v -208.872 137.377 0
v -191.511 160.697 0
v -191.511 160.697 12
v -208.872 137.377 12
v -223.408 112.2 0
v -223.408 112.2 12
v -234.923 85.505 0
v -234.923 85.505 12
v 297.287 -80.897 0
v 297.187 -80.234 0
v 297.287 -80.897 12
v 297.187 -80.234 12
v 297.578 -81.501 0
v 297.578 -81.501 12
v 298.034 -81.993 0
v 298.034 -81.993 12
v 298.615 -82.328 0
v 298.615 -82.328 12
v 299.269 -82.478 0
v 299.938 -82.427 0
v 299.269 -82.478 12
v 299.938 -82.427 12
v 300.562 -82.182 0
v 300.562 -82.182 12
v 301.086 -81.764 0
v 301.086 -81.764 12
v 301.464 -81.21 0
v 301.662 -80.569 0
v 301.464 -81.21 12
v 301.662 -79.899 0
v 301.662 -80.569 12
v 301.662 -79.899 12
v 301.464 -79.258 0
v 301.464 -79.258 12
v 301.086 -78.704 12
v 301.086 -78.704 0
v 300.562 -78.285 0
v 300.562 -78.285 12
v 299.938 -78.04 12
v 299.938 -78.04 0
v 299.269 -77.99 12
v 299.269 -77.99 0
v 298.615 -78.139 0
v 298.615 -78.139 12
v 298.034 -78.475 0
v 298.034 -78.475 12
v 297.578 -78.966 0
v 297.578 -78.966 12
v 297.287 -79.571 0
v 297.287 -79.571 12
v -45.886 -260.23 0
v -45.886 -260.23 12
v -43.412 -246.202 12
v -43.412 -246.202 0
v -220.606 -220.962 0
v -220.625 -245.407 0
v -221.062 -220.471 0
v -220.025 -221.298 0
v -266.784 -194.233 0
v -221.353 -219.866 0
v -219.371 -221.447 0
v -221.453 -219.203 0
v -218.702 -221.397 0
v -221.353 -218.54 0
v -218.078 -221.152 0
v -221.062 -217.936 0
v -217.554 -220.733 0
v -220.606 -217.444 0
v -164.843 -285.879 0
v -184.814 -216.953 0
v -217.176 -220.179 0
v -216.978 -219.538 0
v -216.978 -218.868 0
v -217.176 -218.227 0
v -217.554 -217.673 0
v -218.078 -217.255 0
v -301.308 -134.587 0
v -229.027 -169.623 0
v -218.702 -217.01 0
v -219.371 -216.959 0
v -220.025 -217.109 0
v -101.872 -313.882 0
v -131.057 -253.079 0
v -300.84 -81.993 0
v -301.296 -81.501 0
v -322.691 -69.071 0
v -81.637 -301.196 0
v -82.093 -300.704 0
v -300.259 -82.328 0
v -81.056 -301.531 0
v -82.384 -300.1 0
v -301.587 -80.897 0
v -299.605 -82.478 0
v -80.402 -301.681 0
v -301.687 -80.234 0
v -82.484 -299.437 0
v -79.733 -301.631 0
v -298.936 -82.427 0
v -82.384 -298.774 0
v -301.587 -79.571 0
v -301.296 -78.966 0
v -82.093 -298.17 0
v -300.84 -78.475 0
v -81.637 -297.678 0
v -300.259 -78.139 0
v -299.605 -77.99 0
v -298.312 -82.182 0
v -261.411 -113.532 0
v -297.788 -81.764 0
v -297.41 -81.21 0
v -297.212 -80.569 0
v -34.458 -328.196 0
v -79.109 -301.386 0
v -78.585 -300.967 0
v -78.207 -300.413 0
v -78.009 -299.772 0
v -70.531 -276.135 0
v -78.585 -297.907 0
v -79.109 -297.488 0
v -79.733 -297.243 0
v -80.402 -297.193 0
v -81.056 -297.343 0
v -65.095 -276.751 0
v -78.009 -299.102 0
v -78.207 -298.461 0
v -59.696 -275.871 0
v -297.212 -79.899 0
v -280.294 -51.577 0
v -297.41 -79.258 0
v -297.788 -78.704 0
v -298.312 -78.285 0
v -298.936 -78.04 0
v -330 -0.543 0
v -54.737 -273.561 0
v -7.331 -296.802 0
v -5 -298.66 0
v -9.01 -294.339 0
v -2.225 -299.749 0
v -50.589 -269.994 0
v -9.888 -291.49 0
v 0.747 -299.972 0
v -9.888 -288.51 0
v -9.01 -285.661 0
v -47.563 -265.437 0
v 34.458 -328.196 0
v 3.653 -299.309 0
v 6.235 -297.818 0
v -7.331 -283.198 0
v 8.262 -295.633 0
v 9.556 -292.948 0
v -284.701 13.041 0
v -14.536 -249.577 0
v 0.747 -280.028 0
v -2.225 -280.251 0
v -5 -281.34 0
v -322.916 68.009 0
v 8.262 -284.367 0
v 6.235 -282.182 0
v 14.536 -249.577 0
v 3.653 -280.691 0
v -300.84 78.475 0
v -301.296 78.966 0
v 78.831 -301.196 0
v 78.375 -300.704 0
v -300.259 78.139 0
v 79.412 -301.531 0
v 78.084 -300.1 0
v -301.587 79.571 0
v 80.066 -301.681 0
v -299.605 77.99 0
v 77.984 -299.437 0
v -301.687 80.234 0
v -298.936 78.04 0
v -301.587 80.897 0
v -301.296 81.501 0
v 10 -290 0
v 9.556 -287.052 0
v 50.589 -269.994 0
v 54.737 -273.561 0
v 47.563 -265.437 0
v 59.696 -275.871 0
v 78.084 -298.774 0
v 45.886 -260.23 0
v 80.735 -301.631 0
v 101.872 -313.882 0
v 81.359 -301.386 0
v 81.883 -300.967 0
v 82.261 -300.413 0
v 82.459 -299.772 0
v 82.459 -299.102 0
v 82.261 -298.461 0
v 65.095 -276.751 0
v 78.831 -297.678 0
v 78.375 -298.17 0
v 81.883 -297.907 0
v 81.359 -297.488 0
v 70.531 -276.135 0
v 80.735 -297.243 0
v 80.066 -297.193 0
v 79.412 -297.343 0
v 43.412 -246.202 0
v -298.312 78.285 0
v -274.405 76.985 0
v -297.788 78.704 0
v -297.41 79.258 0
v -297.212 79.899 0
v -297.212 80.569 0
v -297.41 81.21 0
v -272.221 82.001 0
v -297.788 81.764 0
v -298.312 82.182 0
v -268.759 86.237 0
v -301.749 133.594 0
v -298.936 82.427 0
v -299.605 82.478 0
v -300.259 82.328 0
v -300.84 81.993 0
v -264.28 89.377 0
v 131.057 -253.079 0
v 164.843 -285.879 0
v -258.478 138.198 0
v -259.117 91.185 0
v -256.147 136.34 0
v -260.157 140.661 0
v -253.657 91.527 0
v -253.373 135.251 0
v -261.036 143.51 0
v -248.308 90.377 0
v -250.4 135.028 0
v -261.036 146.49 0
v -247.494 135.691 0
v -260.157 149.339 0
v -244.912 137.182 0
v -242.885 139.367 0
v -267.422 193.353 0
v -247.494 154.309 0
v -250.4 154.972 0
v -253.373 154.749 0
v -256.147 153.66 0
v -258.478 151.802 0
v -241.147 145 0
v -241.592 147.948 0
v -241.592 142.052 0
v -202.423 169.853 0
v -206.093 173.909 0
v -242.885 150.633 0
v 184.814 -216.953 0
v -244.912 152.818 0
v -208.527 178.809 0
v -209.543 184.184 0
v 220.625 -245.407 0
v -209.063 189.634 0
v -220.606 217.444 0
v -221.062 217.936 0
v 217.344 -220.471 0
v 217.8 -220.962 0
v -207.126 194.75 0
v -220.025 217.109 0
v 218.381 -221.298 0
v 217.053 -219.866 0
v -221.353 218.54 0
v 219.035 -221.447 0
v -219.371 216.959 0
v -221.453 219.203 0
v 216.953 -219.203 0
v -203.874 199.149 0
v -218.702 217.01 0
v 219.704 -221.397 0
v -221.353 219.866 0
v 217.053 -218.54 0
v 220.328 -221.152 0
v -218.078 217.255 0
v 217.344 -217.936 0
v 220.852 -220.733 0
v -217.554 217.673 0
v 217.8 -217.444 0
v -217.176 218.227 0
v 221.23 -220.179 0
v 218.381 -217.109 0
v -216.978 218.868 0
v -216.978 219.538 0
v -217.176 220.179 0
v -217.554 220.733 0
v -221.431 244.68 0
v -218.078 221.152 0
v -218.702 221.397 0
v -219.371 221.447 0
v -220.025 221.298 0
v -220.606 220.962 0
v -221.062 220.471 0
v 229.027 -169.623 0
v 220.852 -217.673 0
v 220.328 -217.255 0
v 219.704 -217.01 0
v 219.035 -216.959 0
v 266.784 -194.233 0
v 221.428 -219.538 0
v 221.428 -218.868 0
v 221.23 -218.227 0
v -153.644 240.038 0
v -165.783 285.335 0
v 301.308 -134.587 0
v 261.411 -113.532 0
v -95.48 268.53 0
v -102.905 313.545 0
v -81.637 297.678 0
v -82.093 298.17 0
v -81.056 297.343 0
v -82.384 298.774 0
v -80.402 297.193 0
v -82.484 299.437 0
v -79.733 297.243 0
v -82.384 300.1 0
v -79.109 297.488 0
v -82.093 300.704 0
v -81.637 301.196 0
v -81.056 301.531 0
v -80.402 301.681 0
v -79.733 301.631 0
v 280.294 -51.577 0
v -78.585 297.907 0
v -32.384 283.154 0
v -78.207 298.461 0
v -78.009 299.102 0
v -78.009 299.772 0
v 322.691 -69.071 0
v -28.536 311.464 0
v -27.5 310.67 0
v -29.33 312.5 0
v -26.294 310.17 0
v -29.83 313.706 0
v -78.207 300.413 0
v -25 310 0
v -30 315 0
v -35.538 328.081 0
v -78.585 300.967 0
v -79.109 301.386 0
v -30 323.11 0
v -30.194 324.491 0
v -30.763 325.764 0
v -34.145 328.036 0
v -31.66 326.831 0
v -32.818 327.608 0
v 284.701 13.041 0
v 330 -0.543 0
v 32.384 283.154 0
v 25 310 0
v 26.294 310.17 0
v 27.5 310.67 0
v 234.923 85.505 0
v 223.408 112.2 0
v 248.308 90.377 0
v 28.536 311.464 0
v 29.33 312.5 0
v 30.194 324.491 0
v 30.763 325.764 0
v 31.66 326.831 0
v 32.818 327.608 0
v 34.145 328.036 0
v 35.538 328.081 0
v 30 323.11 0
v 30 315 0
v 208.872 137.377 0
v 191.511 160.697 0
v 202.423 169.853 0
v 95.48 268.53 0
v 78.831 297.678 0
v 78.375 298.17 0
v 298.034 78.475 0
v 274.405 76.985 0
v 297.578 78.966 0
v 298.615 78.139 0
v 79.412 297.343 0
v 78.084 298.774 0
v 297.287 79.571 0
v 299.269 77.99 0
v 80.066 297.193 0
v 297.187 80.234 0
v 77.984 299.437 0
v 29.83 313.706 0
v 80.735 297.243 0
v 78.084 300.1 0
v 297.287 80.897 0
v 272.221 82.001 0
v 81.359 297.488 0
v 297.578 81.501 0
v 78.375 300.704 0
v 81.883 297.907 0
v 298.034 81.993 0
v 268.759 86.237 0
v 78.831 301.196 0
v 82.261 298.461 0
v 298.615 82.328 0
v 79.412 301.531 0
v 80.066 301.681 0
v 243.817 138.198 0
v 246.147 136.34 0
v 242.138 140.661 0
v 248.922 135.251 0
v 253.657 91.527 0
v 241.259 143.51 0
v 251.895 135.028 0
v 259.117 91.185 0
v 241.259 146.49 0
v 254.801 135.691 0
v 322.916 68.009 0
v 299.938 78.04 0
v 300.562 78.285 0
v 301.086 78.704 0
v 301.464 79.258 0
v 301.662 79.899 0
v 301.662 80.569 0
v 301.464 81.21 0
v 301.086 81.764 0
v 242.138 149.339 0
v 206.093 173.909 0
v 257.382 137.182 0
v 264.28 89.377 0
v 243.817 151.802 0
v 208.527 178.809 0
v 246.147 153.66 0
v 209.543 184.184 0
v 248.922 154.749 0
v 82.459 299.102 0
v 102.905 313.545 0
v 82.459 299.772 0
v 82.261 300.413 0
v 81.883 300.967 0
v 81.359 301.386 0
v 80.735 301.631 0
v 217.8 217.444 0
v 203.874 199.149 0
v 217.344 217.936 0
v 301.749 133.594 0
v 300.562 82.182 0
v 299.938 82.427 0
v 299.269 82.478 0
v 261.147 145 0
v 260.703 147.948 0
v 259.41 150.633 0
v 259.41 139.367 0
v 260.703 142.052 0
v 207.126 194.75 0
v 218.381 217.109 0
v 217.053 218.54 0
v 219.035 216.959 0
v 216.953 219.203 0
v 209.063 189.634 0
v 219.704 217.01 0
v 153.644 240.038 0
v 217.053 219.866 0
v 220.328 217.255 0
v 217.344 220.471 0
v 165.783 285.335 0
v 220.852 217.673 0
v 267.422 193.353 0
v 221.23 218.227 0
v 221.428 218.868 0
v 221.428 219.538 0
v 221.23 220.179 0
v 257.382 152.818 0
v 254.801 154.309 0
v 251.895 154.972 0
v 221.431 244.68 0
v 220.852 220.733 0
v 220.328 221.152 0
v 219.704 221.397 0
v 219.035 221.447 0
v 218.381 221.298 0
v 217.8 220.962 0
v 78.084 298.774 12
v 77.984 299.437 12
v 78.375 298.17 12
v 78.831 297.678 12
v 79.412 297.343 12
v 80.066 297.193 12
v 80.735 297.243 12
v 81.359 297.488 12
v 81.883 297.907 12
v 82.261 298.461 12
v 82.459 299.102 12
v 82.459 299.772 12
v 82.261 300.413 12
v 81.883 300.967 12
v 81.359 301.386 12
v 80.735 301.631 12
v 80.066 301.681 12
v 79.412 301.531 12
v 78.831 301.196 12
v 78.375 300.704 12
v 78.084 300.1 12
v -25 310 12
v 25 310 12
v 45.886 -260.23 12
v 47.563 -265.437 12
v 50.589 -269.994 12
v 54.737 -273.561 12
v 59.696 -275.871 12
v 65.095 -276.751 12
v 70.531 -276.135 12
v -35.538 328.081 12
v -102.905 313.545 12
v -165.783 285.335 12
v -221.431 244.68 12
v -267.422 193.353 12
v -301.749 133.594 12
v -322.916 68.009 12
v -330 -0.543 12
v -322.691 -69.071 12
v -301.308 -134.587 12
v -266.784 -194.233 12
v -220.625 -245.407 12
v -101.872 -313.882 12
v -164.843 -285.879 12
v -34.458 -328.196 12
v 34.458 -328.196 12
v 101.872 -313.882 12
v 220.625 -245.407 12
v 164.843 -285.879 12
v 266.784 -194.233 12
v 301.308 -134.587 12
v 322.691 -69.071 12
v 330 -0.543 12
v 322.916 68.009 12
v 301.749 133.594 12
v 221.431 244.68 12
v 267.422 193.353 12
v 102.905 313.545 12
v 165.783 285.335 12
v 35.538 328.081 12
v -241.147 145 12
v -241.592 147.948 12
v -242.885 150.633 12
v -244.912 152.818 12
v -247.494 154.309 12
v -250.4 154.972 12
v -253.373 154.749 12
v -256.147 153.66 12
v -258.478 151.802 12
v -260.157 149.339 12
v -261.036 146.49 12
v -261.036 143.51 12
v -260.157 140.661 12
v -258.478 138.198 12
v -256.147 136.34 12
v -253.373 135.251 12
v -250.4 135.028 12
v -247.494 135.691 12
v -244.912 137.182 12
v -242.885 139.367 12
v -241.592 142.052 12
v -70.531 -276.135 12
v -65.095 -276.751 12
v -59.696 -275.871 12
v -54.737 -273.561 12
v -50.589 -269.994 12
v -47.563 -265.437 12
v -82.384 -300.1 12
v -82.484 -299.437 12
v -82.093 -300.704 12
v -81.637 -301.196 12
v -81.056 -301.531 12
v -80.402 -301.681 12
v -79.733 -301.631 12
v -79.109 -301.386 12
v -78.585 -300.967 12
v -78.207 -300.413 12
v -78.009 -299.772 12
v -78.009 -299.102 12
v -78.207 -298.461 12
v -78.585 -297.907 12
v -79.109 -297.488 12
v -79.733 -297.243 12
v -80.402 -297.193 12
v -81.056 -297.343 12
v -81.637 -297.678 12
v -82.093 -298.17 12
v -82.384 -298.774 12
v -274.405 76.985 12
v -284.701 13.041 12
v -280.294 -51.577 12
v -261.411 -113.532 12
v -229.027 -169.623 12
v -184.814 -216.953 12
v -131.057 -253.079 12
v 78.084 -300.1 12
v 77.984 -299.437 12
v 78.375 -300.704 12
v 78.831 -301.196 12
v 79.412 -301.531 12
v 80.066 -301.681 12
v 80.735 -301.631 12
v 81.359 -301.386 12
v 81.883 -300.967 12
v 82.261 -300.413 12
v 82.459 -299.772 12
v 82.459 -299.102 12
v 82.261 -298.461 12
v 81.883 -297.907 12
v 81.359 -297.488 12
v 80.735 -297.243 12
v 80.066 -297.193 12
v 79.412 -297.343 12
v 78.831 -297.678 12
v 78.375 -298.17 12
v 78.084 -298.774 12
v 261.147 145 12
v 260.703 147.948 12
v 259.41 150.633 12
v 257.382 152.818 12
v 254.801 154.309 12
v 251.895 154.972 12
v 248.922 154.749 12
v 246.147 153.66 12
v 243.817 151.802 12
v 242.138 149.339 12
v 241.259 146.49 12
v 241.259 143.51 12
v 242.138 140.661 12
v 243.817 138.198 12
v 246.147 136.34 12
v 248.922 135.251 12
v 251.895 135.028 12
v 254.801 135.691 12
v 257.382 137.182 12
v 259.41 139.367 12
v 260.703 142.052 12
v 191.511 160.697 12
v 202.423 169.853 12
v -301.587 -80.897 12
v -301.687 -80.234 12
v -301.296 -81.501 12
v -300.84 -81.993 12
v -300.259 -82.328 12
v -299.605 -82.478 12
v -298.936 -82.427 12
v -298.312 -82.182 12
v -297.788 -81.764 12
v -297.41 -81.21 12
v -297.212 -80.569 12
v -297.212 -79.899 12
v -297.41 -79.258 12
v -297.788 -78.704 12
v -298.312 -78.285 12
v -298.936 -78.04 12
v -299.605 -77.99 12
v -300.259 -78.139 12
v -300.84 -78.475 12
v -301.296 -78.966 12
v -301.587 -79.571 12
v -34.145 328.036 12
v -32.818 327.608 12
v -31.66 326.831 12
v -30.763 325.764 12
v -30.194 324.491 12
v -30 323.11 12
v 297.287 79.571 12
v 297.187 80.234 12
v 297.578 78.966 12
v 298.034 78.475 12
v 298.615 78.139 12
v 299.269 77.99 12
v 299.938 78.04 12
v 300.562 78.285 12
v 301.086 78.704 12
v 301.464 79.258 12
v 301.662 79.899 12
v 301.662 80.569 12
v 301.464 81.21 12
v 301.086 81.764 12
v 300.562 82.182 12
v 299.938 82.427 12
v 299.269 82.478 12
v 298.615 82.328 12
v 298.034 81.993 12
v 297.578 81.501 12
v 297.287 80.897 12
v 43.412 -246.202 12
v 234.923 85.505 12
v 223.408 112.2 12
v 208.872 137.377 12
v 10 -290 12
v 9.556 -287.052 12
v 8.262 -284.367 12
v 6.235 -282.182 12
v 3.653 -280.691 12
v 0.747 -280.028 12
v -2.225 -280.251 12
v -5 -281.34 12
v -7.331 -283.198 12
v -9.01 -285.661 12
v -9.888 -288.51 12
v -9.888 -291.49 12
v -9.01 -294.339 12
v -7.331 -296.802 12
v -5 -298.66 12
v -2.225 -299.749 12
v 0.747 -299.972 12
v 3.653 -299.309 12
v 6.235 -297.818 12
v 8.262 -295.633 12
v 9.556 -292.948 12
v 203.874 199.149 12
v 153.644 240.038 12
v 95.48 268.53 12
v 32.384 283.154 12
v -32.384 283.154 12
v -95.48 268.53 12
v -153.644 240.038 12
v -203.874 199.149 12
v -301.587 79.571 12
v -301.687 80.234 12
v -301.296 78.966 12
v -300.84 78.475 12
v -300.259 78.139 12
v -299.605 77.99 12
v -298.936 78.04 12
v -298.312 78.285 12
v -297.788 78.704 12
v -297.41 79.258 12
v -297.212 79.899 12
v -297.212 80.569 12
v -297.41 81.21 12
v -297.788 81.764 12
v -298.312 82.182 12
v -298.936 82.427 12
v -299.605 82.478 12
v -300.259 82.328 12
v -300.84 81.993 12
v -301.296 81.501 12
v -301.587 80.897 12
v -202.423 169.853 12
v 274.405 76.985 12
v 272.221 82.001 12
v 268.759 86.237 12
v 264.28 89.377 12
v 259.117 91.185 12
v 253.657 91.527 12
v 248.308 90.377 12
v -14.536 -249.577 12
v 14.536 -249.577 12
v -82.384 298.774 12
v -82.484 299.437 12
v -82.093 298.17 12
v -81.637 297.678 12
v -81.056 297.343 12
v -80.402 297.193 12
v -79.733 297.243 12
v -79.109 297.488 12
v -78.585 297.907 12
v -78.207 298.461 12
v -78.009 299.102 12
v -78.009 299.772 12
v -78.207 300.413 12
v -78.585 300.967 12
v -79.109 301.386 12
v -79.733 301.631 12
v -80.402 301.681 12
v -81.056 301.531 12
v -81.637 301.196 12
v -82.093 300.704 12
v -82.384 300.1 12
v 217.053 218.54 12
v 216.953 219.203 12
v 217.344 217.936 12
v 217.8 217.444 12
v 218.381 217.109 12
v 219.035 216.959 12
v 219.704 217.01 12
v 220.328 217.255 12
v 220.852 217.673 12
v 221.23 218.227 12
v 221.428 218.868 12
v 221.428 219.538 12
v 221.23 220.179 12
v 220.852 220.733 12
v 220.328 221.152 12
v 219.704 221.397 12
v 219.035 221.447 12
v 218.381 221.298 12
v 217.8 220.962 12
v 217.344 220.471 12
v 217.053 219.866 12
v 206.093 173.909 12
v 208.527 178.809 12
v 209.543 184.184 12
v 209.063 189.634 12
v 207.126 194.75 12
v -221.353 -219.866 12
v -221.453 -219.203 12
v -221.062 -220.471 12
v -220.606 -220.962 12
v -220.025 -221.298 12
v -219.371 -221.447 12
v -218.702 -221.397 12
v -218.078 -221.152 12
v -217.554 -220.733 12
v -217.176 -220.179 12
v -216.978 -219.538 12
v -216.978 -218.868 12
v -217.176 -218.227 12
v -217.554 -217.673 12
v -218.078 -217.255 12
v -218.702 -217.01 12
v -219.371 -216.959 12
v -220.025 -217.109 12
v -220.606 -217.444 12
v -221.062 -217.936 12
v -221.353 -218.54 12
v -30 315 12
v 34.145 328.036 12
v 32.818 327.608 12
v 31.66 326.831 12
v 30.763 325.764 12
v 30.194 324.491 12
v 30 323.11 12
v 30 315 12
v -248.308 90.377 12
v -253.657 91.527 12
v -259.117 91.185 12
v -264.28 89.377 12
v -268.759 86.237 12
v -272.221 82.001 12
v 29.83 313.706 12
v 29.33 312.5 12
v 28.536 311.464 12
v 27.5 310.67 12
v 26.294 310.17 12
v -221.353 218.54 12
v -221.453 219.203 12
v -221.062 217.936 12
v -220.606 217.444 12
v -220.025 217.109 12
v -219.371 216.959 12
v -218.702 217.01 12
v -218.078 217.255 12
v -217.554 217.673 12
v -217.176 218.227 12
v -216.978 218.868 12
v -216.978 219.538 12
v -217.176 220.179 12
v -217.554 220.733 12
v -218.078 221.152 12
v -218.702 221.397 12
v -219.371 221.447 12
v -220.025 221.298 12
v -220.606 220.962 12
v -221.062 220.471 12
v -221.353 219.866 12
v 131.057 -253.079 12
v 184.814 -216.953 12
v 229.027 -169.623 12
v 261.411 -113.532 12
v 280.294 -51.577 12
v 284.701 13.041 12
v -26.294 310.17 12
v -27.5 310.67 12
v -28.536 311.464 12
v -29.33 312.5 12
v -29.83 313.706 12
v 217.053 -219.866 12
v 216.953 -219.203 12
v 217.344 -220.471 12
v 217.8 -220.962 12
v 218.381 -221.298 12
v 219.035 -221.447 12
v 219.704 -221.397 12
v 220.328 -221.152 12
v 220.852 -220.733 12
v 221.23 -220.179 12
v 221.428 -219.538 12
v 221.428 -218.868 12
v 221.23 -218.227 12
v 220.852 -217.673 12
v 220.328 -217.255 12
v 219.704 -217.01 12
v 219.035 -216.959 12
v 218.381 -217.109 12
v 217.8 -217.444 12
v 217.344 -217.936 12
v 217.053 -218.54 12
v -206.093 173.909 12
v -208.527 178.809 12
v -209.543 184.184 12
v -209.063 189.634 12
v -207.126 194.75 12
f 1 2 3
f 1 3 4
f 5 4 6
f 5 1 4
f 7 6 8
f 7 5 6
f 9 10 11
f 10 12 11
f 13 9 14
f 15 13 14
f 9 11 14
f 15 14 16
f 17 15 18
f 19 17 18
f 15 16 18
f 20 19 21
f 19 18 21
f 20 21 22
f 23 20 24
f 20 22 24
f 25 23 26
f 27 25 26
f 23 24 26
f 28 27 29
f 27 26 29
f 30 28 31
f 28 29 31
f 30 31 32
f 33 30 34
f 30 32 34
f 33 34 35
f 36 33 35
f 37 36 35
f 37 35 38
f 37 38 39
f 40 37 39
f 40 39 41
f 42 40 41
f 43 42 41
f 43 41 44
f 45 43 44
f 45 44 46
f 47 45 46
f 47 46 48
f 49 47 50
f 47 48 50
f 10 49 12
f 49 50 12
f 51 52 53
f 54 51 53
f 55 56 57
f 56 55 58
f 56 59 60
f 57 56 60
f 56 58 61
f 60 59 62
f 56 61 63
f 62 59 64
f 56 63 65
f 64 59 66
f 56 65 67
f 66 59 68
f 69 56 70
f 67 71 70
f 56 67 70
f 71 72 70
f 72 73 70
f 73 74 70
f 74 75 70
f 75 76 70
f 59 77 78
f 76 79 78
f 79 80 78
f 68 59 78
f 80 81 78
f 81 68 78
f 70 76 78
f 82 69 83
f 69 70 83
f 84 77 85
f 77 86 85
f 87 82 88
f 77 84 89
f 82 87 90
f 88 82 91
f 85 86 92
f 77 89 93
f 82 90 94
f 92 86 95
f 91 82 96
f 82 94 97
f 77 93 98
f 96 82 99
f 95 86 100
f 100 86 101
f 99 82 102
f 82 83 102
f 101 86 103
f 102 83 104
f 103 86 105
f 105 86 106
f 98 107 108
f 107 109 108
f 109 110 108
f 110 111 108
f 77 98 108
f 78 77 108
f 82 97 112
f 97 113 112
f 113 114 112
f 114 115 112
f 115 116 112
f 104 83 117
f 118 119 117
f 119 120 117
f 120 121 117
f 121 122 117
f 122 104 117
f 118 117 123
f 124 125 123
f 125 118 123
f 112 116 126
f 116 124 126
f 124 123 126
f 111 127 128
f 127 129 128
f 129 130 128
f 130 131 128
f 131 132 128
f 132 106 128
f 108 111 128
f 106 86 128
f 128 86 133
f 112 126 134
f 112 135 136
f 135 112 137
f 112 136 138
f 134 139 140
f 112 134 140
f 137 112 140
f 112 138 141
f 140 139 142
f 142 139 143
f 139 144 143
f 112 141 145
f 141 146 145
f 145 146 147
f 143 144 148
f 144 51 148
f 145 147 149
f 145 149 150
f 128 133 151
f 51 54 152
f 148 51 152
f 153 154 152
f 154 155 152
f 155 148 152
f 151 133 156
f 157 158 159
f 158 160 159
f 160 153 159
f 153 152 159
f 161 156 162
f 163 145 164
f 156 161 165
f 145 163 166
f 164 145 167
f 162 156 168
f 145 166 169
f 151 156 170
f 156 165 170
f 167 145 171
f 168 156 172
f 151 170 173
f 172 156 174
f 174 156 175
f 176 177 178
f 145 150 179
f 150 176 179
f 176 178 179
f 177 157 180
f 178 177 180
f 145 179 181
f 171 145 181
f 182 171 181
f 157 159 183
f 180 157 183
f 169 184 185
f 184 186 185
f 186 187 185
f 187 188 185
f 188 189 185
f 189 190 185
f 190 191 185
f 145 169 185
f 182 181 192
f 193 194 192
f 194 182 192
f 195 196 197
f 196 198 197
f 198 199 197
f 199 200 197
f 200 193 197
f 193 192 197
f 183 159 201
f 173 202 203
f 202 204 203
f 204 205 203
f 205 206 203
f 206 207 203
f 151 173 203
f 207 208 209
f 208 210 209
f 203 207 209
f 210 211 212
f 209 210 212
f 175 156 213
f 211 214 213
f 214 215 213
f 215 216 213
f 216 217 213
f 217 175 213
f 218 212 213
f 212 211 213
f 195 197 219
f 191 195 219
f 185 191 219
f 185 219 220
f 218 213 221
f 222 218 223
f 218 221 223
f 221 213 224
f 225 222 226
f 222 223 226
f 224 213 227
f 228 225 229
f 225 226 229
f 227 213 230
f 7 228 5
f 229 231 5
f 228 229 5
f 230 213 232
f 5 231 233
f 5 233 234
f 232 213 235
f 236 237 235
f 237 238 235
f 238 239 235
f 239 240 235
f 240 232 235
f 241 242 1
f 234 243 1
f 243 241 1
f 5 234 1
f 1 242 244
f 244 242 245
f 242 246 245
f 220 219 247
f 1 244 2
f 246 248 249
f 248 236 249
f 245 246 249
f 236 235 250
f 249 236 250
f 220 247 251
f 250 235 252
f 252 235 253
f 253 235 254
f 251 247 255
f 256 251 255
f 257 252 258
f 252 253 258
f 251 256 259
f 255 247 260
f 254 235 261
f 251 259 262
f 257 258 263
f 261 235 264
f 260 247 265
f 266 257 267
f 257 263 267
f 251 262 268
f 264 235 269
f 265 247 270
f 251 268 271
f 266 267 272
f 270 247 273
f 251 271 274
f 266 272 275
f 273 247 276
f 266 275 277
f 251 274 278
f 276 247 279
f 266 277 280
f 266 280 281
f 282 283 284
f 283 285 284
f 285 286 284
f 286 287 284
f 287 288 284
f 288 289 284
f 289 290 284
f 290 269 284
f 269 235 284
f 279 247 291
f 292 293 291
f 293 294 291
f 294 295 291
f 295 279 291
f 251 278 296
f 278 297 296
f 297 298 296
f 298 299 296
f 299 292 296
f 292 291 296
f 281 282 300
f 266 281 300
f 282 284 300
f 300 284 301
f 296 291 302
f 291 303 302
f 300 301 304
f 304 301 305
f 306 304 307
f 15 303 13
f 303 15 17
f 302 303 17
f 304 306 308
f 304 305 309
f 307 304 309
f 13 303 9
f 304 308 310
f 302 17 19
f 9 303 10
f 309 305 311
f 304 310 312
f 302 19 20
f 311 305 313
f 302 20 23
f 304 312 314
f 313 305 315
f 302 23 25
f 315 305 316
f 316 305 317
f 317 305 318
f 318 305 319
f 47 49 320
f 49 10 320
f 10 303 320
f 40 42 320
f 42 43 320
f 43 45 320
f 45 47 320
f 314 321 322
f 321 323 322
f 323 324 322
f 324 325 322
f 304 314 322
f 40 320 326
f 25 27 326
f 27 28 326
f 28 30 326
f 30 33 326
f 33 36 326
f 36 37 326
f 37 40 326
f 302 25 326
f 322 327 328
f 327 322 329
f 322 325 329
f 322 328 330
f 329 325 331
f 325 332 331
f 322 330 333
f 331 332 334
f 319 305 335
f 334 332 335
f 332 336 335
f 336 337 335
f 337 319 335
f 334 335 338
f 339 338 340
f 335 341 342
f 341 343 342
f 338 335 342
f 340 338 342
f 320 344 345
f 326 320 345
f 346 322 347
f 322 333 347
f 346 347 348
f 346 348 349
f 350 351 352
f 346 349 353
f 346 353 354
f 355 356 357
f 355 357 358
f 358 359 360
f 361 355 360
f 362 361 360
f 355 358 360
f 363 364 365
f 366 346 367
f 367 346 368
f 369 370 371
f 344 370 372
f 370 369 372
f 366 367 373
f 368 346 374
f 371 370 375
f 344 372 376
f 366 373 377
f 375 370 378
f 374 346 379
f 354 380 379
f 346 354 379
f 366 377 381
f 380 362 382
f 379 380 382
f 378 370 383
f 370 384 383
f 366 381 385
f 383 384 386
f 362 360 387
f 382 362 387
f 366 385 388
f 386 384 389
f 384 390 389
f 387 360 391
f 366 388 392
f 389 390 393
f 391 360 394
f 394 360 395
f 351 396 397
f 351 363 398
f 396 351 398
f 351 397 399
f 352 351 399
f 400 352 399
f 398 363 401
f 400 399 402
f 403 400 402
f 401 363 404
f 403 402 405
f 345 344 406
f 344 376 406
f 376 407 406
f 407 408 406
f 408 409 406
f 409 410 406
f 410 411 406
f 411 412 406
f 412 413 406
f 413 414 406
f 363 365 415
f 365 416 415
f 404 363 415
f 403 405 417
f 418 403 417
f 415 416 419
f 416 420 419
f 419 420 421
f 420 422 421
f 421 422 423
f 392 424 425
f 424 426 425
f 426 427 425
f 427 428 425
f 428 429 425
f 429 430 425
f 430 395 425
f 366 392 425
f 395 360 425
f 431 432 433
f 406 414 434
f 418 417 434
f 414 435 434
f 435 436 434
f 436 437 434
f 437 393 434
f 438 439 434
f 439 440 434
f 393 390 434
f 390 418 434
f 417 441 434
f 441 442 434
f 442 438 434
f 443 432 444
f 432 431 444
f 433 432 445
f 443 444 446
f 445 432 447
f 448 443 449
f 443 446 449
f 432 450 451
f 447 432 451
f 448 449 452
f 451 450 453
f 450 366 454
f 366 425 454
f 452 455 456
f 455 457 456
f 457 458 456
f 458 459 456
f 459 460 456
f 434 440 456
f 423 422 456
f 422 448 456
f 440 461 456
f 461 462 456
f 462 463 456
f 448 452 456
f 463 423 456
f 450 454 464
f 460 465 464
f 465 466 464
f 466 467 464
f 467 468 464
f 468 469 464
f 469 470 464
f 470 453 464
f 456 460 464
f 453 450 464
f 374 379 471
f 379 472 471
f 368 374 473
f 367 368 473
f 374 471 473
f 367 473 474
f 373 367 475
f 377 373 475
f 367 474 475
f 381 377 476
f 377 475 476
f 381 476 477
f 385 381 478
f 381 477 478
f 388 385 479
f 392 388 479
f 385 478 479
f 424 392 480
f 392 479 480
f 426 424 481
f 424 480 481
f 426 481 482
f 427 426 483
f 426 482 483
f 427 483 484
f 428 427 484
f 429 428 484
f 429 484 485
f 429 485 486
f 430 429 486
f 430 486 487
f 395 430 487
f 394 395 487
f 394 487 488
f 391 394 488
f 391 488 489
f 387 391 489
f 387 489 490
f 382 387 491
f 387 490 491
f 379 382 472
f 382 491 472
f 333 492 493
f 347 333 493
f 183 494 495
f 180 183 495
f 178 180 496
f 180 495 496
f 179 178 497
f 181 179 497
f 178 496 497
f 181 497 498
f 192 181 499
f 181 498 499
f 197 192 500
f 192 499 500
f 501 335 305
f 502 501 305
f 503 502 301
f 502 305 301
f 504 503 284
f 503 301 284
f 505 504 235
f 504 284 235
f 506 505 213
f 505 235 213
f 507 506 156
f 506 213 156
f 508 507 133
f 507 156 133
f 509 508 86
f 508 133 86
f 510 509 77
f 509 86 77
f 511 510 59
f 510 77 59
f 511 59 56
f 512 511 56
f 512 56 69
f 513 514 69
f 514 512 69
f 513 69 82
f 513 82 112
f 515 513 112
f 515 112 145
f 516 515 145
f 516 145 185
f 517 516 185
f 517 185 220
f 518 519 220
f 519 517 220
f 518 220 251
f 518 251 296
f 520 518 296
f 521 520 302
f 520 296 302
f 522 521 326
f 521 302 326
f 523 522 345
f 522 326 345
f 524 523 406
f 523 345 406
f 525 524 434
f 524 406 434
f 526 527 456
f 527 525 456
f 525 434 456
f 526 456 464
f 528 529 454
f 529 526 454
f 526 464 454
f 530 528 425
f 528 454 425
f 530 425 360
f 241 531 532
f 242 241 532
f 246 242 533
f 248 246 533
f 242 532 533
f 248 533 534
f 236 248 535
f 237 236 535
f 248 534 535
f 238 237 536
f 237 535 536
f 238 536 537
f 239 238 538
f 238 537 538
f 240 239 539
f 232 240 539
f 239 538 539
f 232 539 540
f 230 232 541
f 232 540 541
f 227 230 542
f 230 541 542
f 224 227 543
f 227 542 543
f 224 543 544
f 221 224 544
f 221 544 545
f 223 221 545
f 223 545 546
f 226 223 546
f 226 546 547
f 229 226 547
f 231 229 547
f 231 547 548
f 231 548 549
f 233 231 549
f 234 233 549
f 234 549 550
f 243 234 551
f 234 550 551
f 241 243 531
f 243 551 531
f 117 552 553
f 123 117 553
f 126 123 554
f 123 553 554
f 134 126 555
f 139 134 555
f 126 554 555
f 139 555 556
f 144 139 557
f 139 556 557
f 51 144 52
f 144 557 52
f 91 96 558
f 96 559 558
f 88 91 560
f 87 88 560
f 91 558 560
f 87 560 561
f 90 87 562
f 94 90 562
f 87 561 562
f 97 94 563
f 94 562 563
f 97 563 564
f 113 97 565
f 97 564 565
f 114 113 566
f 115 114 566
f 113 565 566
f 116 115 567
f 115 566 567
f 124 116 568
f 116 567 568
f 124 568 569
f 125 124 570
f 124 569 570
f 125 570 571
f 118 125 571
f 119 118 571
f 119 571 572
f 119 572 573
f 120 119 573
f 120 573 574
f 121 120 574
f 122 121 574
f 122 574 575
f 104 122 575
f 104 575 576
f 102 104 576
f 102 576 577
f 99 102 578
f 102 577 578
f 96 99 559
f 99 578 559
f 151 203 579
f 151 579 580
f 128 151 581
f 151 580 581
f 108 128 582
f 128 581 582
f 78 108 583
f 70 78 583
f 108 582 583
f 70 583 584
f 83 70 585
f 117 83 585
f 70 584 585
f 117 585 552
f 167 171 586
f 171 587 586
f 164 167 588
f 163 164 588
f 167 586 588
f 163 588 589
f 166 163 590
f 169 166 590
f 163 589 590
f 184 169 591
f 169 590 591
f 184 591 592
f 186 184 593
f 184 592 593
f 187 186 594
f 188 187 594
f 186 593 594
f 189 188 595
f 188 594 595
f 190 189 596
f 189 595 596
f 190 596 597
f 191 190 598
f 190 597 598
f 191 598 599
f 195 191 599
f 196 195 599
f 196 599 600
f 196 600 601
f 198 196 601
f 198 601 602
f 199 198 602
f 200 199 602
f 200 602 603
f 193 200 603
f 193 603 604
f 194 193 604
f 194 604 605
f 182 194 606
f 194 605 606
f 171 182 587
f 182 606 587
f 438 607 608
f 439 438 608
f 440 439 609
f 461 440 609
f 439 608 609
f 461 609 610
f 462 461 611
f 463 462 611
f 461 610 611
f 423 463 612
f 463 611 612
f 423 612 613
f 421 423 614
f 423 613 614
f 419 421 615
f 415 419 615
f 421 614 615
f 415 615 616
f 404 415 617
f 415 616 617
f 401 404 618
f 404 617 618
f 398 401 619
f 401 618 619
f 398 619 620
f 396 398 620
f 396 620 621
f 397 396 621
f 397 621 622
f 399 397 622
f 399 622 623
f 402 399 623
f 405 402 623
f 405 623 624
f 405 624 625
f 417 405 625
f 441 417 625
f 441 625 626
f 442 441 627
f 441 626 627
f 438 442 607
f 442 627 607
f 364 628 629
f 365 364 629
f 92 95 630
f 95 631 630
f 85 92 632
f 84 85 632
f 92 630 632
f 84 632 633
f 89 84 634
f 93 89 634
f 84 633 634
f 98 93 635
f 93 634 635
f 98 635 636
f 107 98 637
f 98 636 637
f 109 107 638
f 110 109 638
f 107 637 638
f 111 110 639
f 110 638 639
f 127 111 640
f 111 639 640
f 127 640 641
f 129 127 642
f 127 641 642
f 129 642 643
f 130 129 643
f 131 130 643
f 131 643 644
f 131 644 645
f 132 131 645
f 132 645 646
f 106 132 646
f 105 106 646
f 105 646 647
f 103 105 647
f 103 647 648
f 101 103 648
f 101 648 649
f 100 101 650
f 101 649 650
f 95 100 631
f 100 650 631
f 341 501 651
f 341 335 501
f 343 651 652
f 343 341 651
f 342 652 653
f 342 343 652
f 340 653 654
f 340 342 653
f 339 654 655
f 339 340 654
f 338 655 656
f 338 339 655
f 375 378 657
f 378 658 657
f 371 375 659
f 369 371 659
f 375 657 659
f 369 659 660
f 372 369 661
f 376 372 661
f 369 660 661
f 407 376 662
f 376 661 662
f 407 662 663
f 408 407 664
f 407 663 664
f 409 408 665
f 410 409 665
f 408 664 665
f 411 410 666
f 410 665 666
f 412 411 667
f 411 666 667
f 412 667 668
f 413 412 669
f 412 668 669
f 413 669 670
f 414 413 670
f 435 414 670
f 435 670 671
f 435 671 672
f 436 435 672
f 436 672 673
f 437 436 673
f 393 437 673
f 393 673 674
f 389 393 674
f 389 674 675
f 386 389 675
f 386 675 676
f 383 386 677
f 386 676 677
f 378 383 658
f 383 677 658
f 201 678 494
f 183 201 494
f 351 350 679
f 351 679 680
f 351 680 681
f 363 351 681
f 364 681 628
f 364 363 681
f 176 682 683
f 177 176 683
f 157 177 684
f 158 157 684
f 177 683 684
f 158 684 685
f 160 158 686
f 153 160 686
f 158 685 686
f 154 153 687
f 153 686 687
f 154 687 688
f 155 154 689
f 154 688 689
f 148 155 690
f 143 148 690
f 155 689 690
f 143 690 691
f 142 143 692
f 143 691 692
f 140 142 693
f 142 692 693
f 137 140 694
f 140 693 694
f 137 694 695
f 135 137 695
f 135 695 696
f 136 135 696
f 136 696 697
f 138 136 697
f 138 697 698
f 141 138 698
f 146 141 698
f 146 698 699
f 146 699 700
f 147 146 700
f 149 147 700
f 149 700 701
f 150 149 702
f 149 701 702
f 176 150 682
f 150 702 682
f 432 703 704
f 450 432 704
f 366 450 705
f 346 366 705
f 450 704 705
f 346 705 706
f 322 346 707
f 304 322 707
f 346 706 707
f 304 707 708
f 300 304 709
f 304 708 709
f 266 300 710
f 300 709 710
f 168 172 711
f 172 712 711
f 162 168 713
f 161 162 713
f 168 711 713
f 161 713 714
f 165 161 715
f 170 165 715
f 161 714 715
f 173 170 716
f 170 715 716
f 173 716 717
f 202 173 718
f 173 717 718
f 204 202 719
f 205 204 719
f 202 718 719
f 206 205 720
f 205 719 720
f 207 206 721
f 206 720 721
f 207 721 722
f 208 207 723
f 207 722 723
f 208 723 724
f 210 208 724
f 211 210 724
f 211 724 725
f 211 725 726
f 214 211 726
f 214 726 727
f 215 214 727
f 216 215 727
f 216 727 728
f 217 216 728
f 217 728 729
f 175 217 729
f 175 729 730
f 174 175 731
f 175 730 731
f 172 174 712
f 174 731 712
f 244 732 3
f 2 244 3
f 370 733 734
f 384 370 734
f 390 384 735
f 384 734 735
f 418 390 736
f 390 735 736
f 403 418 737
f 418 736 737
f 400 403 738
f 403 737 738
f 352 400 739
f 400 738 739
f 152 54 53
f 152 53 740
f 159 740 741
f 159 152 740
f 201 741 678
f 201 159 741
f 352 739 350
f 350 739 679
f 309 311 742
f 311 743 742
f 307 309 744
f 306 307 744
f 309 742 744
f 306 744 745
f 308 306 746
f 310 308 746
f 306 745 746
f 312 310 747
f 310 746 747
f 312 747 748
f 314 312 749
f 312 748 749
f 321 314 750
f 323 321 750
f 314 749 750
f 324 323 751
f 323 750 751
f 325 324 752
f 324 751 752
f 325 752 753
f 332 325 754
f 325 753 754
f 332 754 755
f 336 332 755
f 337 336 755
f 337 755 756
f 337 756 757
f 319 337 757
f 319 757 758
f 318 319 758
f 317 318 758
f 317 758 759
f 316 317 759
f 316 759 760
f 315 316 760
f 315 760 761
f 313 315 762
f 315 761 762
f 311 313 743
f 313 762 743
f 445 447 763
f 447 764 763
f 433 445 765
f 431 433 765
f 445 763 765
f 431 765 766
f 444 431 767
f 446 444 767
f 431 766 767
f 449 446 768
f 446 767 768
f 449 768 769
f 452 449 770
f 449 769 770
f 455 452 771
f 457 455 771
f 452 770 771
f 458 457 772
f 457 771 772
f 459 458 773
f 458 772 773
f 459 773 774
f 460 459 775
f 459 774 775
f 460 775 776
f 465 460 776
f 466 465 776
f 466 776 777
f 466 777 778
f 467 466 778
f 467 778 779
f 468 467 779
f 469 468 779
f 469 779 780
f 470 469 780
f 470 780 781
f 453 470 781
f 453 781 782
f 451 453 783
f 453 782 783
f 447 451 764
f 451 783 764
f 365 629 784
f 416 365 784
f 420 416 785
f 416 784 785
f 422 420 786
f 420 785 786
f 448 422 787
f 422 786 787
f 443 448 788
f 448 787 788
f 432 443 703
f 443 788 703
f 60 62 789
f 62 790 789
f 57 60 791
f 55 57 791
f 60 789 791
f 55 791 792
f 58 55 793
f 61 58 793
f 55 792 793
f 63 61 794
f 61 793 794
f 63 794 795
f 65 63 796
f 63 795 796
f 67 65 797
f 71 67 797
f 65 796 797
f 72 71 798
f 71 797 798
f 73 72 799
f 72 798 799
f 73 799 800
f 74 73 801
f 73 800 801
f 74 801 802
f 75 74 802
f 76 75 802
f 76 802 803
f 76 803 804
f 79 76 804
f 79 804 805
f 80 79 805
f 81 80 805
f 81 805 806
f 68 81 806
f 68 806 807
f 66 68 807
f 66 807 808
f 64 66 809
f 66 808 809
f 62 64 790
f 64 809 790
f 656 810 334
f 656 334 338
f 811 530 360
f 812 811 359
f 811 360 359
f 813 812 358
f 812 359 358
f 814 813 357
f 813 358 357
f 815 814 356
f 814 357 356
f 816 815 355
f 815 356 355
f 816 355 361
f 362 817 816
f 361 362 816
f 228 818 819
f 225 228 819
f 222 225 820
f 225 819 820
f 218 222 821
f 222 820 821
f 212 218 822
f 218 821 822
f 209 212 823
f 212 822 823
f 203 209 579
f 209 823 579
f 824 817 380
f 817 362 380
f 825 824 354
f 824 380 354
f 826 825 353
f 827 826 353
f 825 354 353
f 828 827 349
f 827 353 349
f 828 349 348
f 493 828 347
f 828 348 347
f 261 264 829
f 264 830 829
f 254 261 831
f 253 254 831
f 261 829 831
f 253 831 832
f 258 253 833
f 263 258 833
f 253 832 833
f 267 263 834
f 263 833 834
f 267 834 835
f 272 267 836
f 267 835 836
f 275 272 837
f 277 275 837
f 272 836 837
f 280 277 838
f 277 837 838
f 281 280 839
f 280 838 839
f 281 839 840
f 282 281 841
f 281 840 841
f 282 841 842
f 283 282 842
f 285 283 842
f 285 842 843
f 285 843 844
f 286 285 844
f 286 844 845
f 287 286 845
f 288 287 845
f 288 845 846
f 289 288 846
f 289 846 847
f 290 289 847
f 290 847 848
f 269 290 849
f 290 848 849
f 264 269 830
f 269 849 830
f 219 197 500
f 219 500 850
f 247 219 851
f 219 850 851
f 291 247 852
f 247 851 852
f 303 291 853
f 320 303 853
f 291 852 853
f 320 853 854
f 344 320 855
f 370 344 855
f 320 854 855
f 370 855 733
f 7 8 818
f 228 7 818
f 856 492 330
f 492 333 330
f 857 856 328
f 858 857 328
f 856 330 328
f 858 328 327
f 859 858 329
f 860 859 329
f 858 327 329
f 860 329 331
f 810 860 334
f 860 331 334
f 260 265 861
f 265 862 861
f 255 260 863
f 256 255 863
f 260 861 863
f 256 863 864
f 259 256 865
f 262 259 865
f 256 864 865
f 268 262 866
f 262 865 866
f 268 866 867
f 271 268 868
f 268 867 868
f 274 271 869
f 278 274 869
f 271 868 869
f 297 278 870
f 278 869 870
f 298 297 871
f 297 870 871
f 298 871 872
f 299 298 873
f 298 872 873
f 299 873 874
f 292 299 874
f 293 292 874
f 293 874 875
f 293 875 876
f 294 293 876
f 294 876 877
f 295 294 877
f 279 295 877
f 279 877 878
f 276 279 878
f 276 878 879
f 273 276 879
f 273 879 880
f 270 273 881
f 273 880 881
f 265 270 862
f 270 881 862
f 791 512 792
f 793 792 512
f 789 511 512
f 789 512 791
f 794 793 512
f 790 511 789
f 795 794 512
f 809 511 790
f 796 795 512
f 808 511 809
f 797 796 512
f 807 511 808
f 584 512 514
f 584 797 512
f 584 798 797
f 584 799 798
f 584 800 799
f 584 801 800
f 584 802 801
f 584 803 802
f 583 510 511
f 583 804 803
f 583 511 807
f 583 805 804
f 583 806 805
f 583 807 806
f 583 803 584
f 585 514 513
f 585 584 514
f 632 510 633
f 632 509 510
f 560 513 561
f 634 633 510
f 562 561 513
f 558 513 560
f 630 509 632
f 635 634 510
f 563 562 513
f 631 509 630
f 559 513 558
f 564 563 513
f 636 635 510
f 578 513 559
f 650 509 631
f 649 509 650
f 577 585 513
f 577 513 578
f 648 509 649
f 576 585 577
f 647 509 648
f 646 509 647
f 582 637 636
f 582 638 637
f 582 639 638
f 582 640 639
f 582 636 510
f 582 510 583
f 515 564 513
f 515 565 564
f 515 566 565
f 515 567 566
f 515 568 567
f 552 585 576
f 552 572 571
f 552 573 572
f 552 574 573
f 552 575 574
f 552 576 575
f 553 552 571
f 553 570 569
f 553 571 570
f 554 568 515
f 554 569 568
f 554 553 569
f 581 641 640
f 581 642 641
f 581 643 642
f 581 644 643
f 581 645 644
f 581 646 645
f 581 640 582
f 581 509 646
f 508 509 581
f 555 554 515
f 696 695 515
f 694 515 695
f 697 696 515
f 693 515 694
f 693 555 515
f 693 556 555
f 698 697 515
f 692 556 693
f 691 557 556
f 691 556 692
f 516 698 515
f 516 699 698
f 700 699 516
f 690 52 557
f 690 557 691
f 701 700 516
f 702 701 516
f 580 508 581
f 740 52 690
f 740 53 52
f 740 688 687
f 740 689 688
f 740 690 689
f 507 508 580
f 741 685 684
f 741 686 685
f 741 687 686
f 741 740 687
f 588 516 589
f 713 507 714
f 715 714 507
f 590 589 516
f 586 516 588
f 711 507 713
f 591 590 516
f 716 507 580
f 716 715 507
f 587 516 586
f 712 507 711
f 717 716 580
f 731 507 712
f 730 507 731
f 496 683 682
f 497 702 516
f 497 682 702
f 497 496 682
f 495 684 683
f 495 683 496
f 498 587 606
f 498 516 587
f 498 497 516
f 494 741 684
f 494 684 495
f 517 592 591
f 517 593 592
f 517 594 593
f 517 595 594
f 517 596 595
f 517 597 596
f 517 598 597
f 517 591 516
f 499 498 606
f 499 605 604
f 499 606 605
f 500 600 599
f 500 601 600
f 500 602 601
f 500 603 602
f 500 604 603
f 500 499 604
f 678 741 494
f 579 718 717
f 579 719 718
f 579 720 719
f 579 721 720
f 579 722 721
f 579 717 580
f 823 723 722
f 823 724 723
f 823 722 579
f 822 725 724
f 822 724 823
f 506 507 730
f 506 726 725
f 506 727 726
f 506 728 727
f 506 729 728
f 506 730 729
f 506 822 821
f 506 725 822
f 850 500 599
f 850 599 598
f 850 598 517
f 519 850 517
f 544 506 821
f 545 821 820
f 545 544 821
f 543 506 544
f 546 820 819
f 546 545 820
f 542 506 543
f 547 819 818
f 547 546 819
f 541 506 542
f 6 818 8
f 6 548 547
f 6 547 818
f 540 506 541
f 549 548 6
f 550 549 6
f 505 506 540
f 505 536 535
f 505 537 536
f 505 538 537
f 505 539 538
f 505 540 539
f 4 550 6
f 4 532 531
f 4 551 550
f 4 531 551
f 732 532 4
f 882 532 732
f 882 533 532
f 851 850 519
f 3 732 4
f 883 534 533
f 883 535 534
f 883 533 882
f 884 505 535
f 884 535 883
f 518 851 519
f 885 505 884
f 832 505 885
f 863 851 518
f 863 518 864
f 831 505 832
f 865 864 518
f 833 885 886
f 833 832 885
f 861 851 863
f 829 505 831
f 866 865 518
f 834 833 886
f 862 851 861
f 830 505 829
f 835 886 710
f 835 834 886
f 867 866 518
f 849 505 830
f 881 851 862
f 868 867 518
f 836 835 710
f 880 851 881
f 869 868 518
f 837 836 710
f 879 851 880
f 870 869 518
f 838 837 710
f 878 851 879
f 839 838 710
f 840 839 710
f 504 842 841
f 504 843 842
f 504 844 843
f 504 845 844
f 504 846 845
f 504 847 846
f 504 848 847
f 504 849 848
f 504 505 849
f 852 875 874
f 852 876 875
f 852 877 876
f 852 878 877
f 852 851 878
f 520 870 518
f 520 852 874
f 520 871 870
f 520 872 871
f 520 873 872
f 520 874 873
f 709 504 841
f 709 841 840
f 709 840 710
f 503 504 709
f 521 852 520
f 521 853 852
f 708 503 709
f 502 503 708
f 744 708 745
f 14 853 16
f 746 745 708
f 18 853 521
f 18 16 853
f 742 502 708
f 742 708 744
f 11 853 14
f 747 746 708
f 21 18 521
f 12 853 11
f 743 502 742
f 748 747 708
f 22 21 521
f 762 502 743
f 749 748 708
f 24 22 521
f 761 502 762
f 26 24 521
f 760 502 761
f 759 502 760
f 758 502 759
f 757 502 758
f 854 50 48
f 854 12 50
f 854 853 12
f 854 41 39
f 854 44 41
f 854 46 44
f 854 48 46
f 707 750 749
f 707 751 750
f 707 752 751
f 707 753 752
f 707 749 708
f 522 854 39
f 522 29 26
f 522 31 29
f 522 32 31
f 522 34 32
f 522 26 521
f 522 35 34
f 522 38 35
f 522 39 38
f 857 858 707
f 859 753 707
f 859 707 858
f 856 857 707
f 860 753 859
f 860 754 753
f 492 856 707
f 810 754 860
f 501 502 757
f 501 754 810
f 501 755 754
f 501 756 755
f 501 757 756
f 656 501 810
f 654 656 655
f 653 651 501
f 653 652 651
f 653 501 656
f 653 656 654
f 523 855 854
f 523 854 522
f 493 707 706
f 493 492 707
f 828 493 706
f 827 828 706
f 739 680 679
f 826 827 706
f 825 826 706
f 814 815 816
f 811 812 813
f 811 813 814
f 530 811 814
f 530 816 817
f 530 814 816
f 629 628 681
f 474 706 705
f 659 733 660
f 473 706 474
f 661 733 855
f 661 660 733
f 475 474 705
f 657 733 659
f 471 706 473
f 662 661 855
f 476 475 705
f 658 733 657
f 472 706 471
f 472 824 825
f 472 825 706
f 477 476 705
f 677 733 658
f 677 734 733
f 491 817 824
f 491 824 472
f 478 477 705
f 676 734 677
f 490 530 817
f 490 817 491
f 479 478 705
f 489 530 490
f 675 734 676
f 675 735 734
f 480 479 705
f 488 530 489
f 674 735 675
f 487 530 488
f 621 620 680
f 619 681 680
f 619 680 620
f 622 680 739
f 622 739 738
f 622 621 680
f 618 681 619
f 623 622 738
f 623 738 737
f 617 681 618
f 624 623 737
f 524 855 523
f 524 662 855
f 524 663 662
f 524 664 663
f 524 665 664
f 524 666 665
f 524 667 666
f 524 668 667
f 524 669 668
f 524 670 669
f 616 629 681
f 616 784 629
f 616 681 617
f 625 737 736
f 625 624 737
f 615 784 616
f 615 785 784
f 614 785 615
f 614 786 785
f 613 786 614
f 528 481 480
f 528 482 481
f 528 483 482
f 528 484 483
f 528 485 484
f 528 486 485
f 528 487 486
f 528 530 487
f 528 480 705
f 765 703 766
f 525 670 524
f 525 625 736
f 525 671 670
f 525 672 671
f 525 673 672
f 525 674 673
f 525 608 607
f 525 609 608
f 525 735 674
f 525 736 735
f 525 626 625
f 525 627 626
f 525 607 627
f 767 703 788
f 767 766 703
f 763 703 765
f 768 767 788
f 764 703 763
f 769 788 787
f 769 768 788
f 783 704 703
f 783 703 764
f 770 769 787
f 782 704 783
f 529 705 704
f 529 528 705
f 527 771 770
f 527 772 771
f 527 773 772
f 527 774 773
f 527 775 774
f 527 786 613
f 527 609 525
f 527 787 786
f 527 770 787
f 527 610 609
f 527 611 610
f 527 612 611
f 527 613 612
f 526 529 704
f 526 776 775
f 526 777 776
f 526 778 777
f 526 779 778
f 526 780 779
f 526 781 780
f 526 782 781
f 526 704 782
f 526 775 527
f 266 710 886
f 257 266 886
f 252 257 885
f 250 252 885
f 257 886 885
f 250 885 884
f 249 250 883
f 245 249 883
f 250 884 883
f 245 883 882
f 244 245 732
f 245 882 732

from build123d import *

# Parameters (mm, degrees)
SKETCH2_R                                      = 330
SKETCH2_R_2                                    = 250
BOSS_EXTRUDE1_DEPTH                            = 12
CUT_EXTRUDE1_DEPTH                             = 12
SKETCH4_R                                      = 10
CUT_EXTRUDE2_DEPTH                             = 12
SKETCH5_W                                      = 60
SKETCH5_H                                      = 60
CUT_EXTRUDE3_DEPTH                             = 12
FILLET1_R                                      = 5
CSK_FOR_M4_FLAT_HEAD_MACHINE_SCREW_D           = 4.5
CSK_FOR_M4_FLAT_HEAD_MACHINE_SCREW_CSINK_D     = 9.4
CSK_FOR_M4_FLAT_HEAD_MACHINE_SCREW_CSINK_ANGLE = 90


with BuildPart() as part:
    # Sketch2 → Boss-Extrude1 (new body)
    with BuildSketch(Plane.XY):
        Circle(SKETCH2_R)
        Circle(SKETCH2_R_2, mode=Mode.SUBTRACT)
    extrude(amount=BOSS_EXTRUDE1_DEPTH)

    # Sketch3 → Cut-Extrude1 (cut)
    with BuildSketch(Plane.XY.offset(12)):
        with BuildLine():
            Line((191.51111078, 160.696902422), (202.422805046, 169.852901056))
            ThreePointArc((202.422805046, 169.852901056), (209.542560602, 184.184300077), (203.874000238, 199.14917029))
            ThreePointArc((203.874000238, 199.14917029), (0, 285), (-203.874000238, 199.14917029))
            ThreePointArc((-203.874000238, 199.14917029), (-209.542560602, 184.184300077), (-202.422805046, 169.852901056))
            Line((-202.422805046, 169.852901056), (-191.51111078, 160.696902422))
            ThreePointArc((-191.51111078, 160.696902422), (0, 250), (191.51111078, 160.696902422))
        make_face()
        with BuildLine():
            Line((43.412044417, -246.201938253), (45.885524698, -260.229742003))
            ThreePointArc((45.885524698, -260.229742003), (54.737002544, -273.561330694), (70.531240495, -276.134648522))
            ThreePointArc((70.531240495, -276.134648522), (246.817240079, -142.5), (274.405240732, 76.985478232))
            ThreePointArc((274.405240732, 76.985478232), (264.279563146, 89.377030617), (248.308329744, 90.376840947))
            Line((248.308329744, 90.376840947), (234.923155196, 85.505035831))
            ThreePointArc((234.923155196, 85.505035831), (216.506350946, -125), (43.412044417, -246.201938253))
        make_face()
        with BuildLine():
            Line((-234.923155196, 85.505035831), (-248.308329744, 90.376840947))
            ThreePointArc((-248.308329744, 90.376840947), (-264.279563146, 89.377030617), (-274.405240732, 76.985478232))
            ThreePointArc((-274.405240732, 76.985478232), (-246.817240079, -142.5), (-70.531240495, -276.134648522))
            ThreePointArc((-70.531240495, -276.134648522), (-54.737002544, -273.561330694), (-45.885524698, -260.229742003))
            Line((-45.885524698, -260.229742003), (-43.412044417, -246.201938253))
            ThreePointArc((-43.412044417, -246.201938253), (-216.506350946, -125), (-234.923155196, 85.505035831))
        make_face()
    extrude(amount=-CUT_EXTRUDE1_DEPTH, mode=Mode.SUBTRACT)

    # Sketch4 → Cut-Extrude2 (cut)
    with BuildSketch(Plane.XY.offset(12)):
        with Locations((0, -290)):
            Circle(SKETCH4_R)
        with Locations((-251.147367097, 145)):
            Circle(SKETCH4_R)
        with Locations((251.147367097, 145)):
            Circle(SKETCH4_R)
    extrude(amount=-CUT_EXTRUDE2_DEPTH, mode=Mode.SUBTRACT)

    # Sketch5 → Cut-Extrude3 (cut)
    with BuildSketch(Plane.XY.offset(12)):
        with Locations((0, 340)):
            Rectangle(SKETCH5_W, SKETCH5_H)
    extrude(amount=-CUT_EXTRUDE3_DEPTH, mode=Mode.SUBTRACT)

    # Fillet1
    fillet1_edges = [part.edges().sort_by_distance(p)[0] for p in [
        (30, 328.633534503, 6),
        (-30, 328.633534503, 6),
        (-30, 310, 6),
        (30, 310, 6),
    ]]
    fillet(fillet1_edges, radius=FILLET1_R)

    # CSK for M4 Flat Head Machine Screw (through all)
    with Locations(Plane(origin=(0, 0, -24), x_dir=(1, 0, 0), z_dir=(0, 0, -1))):
        with Locations((80.233903982, 299.43700615), (219.203102168, 219.203102168), (299.43700615, 80.233903982), (299.43700615, -80.233903982), (219.203102168, -219.203102168), (80.233903982, -299.43700615), (-80.233903982, -299.43700615), (-219.203102168, -219.203102168), (-299.43700615, -80.233903982), (-299.43700615, 80.233903982), (-219.203102168, 219.203102168), (-80.233903982, 299.43700615), (0, 0)):
            CounterSinkHole(CSK_FOR_M4_FLAT_HEAD_MACHINE_SCREW_D / 2, CSK_FOR_M4_FLAT_HEAD_MACHINE_SCREW_CSINK_D / 2, counter_sink_angle=CSK_FOR_M4_FLAT_HEAD_MACHINE_SCREW_CSINK_ANGLE)


solid = part.part
